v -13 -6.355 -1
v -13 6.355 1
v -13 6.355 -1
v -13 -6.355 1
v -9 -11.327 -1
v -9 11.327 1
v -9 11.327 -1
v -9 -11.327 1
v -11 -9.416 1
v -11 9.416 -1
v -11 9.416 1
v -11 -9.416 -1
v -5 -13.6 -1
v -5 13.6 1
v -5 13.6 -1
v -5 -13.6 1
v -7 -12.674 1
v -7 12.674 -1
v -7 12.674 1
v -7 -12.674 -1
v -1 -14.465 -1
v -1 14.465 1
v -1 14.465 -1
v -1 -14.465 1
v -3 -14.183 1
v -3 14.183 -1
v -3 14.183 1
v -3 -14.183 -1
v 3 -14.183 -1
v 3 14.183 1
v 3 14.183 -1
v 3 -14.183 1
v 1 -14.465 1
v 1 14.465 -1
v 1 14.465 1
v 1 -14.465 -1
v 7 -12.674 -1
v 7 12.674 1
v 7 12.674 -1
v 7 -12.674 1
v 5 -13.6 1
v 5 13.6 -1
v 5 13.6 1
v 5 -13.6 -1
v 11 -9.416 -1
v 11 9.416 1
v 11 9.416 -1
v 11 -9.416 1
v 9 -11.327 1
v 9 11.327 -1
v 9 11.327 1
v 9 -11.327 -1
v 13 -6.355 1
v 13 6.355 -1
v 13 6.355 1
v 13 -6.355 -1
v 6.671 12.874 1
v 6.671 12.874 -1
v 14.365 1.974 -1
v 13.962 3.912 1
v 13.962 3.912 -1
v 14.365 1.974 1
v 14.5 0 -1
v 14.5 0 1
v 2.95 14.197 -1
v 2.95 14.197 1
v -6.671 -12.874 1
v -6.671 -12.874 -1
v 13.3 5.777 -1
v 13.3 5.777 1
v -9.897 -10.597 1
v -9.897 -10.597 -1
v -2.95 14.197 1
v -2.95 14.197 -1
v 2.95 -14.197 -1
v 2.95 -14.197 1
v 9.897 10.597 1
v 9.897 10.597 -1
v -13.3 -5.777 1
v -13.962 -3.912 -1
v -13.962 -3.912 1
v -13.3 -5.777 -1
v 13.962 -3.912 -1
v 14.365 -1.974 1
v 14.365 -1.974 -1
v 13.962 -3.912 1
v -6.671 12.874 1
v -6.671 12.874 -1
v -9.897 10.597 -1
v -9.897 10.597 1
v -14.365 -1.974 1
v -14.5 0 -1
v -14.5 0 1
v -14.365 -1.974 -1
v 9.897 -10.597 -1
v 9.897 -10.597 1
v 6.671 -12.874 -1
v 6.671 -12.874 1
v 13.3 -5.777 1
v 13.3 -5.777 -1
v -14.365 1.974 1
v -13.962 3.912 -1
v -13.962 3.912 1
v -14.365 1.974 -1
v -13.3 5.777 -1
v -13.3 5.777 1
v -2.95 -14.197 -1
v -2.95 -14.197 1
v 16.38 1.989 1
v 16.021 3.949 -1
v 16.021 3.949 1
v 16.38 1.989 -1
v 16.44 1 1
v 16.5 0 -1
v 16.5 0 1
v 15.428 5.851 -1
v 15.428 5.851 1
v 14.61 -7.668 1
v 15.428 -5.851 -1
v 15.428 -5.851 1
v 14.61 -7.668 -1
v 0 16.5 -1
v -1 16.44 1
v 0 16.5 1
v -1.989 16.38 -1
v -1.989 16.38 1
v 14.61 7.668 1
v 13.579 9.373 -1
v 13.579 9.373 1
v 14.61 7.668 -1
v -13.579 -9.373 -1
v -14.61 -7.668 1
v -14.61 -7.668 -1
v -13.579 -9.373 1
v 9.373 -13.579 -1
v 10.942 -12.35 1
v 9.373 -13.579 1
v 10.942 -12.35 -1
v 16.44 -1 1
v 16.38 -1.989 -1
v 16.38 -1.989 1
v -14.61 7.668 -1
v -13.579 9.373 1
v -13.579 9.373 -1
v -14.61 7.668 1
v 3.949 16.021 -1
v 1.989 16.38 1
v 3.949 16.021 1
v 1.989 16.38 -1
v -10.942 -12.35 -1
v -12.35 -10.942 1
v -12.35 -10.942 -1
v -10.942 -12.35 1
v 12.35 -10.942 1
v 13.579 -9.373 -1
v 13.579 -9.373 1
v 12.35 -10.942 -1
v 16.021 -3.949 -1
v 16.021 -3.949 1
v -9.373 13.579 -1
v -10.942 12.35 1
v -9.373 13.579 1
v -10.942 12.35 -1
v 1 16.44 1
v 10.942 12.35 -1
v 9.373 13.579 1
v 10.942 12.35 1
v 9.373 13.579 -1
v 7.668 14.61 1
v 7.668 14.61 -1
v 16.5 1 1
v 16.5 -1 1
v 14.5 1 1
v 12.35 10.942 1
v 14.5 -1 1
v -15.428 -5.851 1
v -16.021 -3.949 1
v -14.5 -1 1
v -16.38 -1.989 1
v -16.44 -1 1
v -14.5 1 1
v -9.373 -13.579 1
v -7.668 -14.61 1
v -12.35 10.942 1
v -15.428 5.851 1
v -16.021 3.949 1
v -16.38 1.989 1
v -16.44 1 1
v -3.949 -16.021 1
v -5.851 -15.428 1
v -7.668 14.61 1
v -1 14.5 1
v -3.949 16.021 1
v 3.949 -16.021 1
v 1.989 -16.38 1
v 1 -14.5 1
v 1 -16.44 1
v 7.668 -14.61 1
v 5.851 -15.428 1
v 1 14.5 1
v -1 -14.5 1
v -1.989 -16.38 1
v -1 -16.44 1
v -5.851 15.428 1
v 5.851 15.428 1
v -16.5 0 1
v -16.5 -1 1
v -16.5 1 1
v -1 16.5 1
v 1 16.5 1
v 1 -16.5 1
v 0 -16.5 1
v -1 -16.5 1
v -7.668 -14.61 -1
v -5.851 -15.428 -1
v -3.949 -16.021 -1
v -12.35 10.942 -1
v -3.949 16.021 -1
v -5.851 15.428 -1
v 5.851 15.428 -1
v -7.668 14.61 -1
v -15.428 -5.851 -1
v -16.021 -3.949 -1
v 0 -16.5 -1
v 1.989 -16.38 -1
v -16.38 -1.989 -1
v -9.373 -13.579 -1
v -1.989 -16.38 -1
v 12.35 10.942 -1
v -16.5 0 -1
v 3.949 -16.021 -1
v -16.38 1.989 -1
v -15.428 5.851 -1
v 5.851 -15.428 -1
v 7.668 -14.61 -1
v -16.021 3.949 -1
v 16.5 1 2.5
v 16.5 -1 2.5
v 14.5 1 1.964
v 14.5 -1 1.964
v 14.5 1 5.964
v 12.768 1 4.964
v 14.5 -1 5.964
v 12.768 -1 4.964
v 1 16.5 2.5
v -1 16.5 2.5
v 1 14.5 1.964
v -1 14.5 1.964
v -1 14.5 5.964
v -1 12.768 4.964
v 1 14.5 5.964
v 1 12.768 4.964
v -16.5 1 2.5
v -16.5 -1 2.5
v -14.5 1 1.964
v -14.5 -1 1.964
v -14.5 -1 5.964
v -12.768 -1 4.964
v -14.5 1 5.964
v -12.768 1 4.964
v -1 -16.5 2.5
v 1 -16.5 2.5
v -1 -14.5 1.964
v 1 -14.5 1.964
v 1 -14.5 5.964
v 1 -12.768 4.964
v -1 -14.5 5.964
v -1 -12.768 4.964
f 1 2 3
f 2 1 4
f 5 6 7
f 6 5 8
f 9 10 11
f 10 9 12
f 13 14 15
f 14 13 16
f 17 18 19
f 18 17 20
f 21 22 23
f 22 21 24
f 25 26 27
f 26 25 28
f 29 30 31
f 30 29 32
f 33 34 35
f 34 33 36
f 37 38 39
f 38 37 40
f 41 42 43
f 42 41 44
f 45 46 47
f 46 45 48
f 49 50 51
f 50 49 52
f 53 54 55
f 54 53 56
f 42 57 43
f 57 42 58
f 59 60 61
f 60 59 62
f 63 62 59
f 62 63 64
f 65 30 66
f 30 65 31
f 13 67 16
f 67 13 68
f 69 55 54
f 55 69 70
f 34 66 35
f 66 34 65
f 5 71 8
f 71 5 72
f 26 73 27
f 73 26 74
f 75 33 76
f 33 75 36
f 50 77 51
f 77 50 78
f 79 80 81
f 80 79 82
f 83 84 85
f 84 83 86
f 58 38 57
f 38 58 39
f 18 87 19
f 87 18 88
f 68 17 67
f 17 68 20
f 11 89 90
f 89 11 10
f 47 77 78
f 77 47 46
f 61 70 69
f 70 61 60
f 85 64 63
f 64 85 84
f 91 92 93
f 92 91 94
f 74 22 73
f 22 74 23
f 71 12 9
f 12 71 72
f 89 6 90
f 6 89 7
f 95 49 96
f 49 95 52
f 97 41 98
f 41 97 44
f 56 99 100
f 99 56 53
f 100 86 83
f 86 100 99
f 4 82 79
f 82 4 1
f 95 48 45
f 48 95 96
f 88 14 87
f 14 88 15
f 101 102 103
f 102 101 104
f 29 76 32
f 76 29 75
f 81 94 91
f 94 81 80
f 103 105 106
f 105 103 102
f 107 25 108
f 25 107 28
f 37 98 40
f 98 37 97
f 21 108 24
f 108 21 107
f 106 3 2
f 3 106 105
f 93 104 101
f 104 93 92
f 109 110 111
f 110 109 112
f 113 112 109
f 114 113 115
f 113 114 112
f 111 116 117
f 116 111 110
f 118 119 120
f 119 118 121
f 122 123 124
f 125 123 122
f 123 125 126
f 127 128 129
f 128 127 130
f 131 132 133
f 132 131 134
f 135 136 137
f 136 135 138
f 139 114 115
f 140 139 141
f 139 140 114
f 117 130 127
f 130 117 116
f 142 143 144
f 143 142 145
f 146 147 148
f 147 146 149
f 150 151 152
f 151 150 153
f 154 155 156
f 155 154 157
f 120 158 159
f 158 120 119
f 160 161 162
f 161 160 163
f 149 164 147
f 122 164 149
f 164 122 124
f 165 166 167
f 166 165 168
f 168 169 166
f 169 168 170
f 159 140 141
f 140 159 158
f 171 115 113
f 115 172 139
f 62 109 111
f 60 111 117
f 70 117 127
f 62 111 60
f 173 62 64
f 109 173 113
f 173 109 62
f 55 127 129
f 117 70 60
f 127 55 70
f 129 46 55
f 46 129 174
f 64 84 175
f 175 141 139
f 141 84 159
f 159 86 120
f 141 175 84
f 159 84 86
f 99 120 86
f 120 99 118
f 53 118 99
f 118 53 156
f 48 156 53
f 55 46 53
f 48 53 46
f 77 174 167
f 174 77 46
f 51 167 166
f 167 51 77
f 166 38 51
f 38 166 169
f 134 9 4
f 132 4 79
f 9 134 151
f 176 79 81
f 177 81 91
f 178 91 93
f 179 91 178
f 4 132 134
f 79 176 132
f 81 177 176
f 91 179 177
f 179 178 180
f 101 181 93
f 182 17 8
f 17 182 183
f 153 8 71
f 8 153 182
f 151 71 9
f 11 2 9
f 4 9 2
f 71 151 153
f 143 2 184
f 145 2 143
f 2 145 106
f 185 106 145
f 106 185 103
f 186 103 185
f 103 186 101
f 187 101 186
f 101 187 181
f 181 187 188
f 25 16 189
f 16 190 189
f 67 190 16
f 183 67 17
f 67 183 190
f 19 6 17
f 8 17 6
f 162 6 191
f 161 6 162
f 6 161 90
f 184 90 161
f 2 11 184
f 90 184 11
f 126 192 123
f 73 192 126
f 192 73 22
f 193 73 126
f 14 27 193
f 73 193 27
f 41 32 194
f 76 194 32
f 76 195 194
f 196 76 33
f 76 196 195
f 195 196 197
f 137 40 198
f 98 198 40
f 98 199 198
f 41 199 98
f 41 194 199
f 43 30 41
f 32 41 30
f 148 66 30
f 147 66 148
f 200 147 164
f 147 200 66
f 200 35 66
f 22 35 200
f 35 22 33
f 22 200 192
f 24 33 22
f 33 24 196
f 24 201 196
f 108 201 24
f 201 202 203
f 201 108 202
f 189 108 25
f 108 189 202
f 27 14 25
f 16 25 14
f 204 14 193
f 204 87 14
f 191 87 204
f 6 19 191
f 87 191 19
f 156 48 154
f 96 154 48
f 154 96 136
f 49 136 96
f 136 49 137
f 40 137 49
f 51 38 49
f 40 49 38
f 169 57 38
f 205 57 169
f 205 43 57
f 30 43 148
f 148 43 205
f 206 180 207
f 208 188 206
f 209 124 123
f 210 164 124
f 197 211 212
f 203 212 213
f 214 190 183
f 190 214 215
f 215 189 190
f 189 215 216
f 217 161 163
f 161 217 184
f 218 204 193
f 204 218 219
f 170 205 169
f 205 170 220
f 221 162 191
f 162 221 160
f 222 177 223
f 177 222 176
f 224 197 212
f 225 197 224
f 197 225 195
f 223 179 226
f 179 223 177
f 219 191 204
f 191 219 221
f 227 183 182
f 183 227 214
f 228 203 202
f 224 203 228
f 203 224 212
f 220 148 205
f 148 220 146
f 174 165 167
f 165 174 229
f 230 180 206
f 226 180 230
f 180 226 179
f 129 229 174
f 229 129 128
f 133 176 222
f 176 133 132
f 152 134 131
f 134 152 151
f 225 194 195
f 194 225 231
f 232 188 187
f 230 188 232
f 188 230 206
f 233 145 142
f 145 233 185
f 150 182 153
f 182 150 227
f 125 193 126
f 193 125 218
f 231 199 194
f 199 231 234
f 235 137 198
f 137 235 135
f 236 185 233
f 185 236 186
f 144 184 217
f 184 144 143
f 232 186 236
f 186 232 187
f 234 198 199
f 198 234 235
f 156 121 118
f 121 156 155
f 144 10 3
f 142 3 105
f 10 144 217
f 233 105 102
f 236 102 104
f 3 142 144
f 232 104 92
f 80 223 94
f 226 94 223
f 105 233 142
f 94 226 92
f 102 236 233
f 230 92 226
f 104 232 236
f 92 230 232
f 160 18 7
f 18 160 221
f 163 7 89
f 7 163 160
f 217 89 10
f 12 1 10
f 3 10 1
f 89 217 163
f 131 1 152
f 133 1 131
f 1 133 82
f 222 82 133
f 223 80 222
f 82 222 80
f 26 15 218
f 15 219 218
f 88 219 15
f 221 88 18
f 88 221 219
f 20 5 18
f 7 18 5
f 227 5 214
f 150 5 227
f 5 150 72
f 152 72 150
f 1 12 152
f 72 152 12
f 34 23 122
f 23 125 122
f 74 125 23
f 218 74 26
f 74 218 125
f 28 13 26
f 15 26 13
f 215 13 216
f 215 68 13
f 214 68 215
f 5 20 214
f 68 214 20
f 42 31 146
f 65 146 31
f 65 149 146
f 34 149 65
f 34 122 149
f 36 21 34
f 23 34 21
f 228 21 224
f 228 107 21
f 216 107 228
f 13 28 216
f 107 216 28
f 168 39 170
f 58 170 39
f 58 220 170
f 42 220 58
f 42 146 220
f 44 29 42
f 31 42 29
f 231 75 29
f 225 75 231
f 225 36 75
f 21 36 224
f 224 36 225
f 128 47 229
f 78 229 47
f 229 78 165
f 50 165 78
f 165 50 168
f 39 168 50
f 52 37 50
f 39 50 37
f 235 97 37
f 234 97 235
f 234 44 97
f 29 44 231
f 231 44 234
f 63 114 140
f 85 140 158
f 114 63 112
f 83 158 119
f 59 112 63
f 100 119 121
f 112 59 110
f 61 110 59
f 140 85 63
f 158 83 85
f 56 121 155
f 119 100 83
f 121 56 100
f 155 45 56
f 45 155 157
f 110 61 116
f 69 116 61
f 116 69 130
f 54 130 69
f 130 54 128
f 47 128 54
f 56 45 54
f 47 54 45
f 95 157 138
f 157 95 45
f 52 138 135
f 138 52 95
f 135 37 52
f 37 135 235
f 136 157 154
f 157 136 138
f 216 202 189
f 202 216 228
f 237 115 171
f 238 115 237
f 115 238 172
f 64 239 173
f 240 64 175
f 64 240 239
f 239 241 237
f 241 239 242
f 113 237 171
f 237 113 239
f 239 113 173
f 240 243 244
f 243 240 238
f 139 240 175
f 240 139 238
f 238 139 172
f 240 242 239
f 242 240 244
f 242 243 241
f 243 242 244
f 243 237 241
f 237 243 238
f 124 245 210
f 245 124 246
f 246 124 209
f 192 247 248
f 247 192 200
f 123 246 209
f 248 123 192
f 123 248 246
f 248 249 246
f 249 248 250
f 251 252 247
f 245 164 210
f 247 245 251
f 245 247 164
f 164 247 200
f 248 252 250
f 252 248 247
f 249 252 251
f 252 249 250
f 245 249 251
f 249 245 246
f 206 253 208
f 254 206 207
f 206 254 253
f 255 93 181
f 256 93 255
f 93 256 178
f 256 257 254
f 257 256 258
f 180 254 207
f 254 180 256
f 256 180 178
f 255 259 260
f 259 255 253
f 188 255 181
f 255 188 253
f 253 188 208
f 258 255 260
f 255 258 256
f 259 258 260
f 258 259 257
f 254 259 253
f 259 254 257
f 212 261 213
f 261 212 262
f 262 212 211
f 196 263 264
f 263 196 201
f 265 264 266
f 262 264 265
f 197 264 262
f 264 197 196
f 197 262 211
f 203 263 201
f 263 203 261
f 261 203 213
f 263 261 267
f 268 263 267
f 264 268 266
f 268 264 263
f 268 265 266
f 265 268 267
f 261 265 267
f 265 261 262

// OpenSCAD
// Convenience modules.


function segs(r) = $fn>0?($fn>3?$fn:3):(ceil(max(min(360.0/$fa,abs(r)*2*3.14159/$fs),5)));

function hypot(x,y) = sqrt(x*x+y*y);

function distance(point1, point2) =
	sqrt(
		pow(point2[0]-point1[0], 2.0) +
		pow(point2[1]-point1[1], 2.0) +
		((len(point1)<3)? 0.0 : pow(point2[2]-point1[2], 2.0))
	);

function cdr(list) = len(list)>1?[for (i=[1:len(list)-1]) list[i]]:[];
function reverse(list) = [ for (i = [len(list)-1 : -1 : 0]) list[i] ];


// Optionally pre-render if someone sets $do_prerender=true
//$do_prerender = true;
module prerender(convexity=10) {
	if ($do_prerender == true) {
		render(convexity=convexity) {
			children();
		}
	} else {
		children();
	}
}


// Rotates children around the Z axis by the given number of degrees.
// Example:
//   xrot(90) cylinder(h=10, r=2, center=true);
module xrot(a=0)
{
	rotate([a, 0, 0])
		children();
}


// Rotates children around the Y axis by the given number of degrees.
// Example:
//   yrot(90) cylinder(h=10, r=2, center=true);
module yrot(a=0)
{
	rotate([0, a, 0])
		children();
}


// Rotates children around the Z axis by the given number of degrees.
// Example:
//   zrot(90) cube(size=[9,1,4], center=true);
module zrot(a=0)
{
	rotate([0, 0, a])
		children();
}



module skew_along_x(yang=0, zang=0)
{
	multmatrix(m = [
		[1,         0,          0,        0],
		[sin(yang), 1,          0,        0],
		[sin(zang), 0,          1,        0],
		[0,         0,          0,        1]
	]) {
		children();
	}
}



module skew_along_y(xang=0, zang=0)
{
	multmatrix(m = [
		[1, sin(xang),          0,        0],
		[0,         1,          0,        0],
		[0, sin(zang),          1,        0],
		[0,         0,          0,        1]
	]) {
		children();
	}
}



module skew_along_z(xang=0, yang=0)
{
	multmatrix(m = [
		[1,         0,  sin(xang),        0],
		[0,         1,  sin(yang),        0],
		[0,         0,          1,        0],
		[0,         0,          0,        1]
	]) {
		children();
	}
}



module mirror_copy(v=[0,0,1])
{
	union() {
		children();
		mirror(v) children();
	}
}


// Given a number of euller angles, rotates copies of the given children to each of those angles.
// Example:
//   rot_copies(rots=[[0,0,0],[45,0,0],[0,45,120],[90,-45,270]])
//     translate([6,0,0]) cube(size=[9,1,4], center=true);
module rot_copies(rots=[[0,0,0]])
{
	for (rot = rots)
		rotate(rot)
			children();
}



// Given an array of angles, rotates copies of the children to each of those angles around the X axis.
// Example:
//   xrot_copies(rots=[0,15,30,60,120,240]) translate([0,6,0]) cube(size=[4,9,1], center=true);
//   xrot_copies(count=6, offset=15) translate([0,6,0]) cube(size=[4,9,1], center=true);
module xrot_copies(rots=[0], offset=0, count=undef)
{
	if (count != undef) {
		for (i = [0 : count-1]) {
			a = (i / count) * 360.0;
			rotate([a+offset, 0, 0]) {
				children();
			}
		}
	} else {
		for (a = rots) {
			rotate([a+offset, 0, 0]) {
				children();
			}
		}
	}
}


// Given an array of angles, rotates copies of the children to each of those angles around the Y axis.
// Example:
//   yrot_copies(rots=[0,15,30,60,120,240]) translate([6,0,0]) cube(size=[9,4,1], center=true);
//   yrot_copies(count=6, offset=15) translate([6,0,0]) cube(size=[9,4,1], center=true);
module yrot_copies(rots=[0], offset=0, count=undef)
{
	if (count != undef) {
		for (i = [0 : count-1]) {
			a = (i / count) * 360.0;
			rotate([0, a+offset, 0]) {
				children();
			}
		}
	} else {
		for (a = rots) {
			rotate([0, a+offset, 0]) {
				children();
			}
		}
	}
}


// Given an array of angles, rotates copies of the children to each of those angles around the Z axis.
// Example:
//   zrot_copies(rots=[0,15,30,60,120,240]) translate([6,0,0]) cube(size=[9,1,4], center=true);
//   zrot_copies(count=6, offset=15) translate([6,0,0]) cube(size=[9,1,4], center=true);
module zrot_copies(rots=[0], offset=0, count=undef)
{
	if (count != undef) {
		for (i = [0 : count-1]) {
			a = (i / count) * 360.0;
			rotate([0, 0, a+offset]) {
				children();
			}
		}
	} else {
		for (a = rots) {
			rotate([0, 0, a+offset]) {
				children();
			}
		}
	}
}


// Makes copies of the given children at each of the given offsets.
//   offsets = array of XYZ offset vectors. Default [[0,0,0]]
// Example:
//   translate_copies([[-5,-5,0], [5,-5,0], [0,-5,7], [0,5,0]])
//     sphere(r=3,center=true);
module translate_copies(offsets=[[0,0,0]])
{
	for (off = offsets)
		translate(off)
			children();
}


// Makes a 3D XYZ grid of duplicate children.
//   xa = array or range of X-axis values to offset by. (Default: [0])
//   ya = array or range of Y-axis values to offset by. (Default: [0])
//   za = array or range of Z-axis values to offset by. (Default: [0])
//   count = number of copies to have per axis. (Default: none)
//   spacing = spacing of copies per axis. Use with count. (Default: 0)
// Examples:
//   grid_of(xa=[0,2,3,5],ya=[3:5],za=[-4:2:6]) sphere(r=0.5,center=true);
//   grid_of(ya=[-6:3:6],za=[4,7]) sphere(r=1,center=true);
//   grid_of(count=3, spacing=10) sphere(r=1,center=true);
//   grid_of(count=[3, 1, 2], spacing=10) sphere(r=1,center=true);
//   grid_of(count=[3, 4], spacing=[10, 8]) sphere(r=1,center=true);
//   grid_of(count=[3, 4, 2], spacing=[10, 8, 5]) sphere(r=1,center=true, $fn=24);
module grid_of(xa=[0], ya=[0], za=[0], count=[], spacing=[])
{
	count = (len(count) == undef)? [count,1,1] :
			((len(count) == 1)? [count[0], 1, 1] :
			((len(count) == 2)? [count[0], count[1], 1] :
			((len(count) == 3)? count : undef)));

	spacing = (len(spacing) == undef)? [spacing,spacing,spacing] :
			((len(spacing) == 1)? [spacing[0], 0, 0] :
			((len(spacing) == 2)? [spacing[0], spacing[1], 0] :
			((len(spacing) == 3)? spacing : undef)));

	if (count != undef && spacing != undef) {
		for (x = [-(count[0]-1)/2 : (count[0]-1)/2 + 0.1]) {
			for (y = [-(count[1]-1)/2 : (count[1]-1)/2 + 0.1]) {
				for (z = [-(count[2]-1)/2 : (count[2]-1)/2 + 0.1]) {
					translate([x*spacing[0], y*spacing[1], z*spacing[2]]) {
						children();
					}
				}
			}
		}
	} else {
		for (xoff = xa) {
			for (yoff = ya) {
				for (zoff = za) {
					translate([xoff,yoff,zoff]) {
						children();
					}
				}
			}
		}
	}
}


// Evenly distributes n duplicate children around a circle on the XY plane.
//   n = number of copies to distribute around the circle. (Default: 6)
//   r = radius of circle (Default: 1)
//   rx = radius of ellipse on X axis. Used instead of r.
//   ry = radius of ellipse on Y axis. Used instead of r.
//   d = diameter of circle. (Default: 2)
//   dx = diameter of ellipse on X axis. Used instead of d.
//   dy = diameter of ellipse on Y axis. Used instead of d.
//   rot = whether to rotate the copied children.  (Default: false)
//   sa = starting angle. (Default: 0.0)
//   ea = ending angle. Will distribute copies CCW from sa to ea. (Default: 360.0)
// Examples:
//   circle_of(d=8,n=5)
//     cube(size=[3,1,1],center=true);
//   circle_of(r=10,n=12,rot=true)
//     cube(size=[3,1,1],center=true);
//   circle_of(rx=15,ry=10,n=12,rot=true)
//     cube(size=[3,1,1],center=true);
//   circle_of(r=10,n=5,rot=true,sa=30.0,ea=150.0)
//     cube(size=[3,1,1],center=true);
//
module circle_of(
		n=6,
		r=1, rx=undef, ry=undef,
		d=undef, dx=undef, dy=undef,
		sa=0.0, ea=360.0,
		rot=false
) {
	r = (d == undef)?r:(d/2.0);
	rx = (dx == undef)?rx:(dx/2.0);
	ry = (dy == undef)?rx:(dy/2.0);
	rx = (rx == undef)?r:rx;
	ry = (ry == undef)?r:ry;
	sa = ((sa % 360.0) + 360.0) % 360.0; // make 0 < ang < 360 
	ea = ((ea % 360.0) + 360.0) % 360.0; // make 0 < ang < 360
	n = (abs(ea-sa)<0.01)?(n+1):n;
	delt = (((ea<=sa)?360.0:0)+ea-sa)/(n-1);
	for (ang = [sa:delt:(sa+delt*(n-1))])
		if (abs(abs(ang-sa)-360.0) > 0.01)
			translate([cos(ang)*rx,sin(ang)*ry,0])
				rotate([0,0,rot?atan2(sin(ang)*ry,cos(ang)*rx):0])
					children();
}



// Evenly distributes n duplicate children along an XYZ line.
//   p1 = starting point of line.  (Default: [0,0,0])
//   p2 = ending point of line.  (Default: [10,0,0])
//   n = number of copies to distribute along the line. (Default: 6)
// Examples:
//   line_of(p1=[0,0,0], p2=[-10,15,20], n=5)
//     cube(size=[3,1,1],center=true);
//
module line_of(p1=[0,0,0], p2=[10,0,0], n=6)
{
	delta = (p2 - p1) / (n-1);
	for (i = [0:n-1])
		translate([p1[0]+delta[0]*i, p1[1]+delta[1]*i, p1[2]+delta[2]*i])
			children();
}


// Makes a cube with rounded edges and corners.
//   size = size of cube [X,Y,Z].  (Default: [1,1,1])
//   r = radius of edge/corner rounding.  (Default: 0.25)
// Examples:
//   rcube(size=[9,4,1], r=0.333, center=true, $fn=24);
//   rcube(size=[5,7,3], r=1);
module rcube(size=[1,1,1], r=0.25, center=false, $fn=undef)
{
	$fn = ($fn==undef)?max(18,floor(180/asin(1/r)/2)*2):$fn;
	xoff=abs(size[0])/2-r;
	yoff=abs(size[1])/2-r;
	zoff=abs(size[2])/2-r;
	offset = center?[0,0,0]:size/2;
	translate(offset) {
		union() {
			grid_of([-xoff,xoff],[-yoff,yoff],[-zoff,zoff])
				sphere(r=r,center=true,$fn=$fn);
			grid_of(xa=[-xoff,xoff],ya=[-yoff,yoff])
				cylinder(r=r,h=zoff*2,center=true,$fn=$fn);
			grid_of(xa=[-xoff,xoff],za=[-zoff,zoff])
				rotate([90,0,0])
					cylinder(r=r,h=yoff*2,center=true,$fn=$fn);
			grid_of(ya=[-yoff,yoff],za=[-zoff,zoff])
				rotate([90,0,0])
				rotate([0,90,0])
					cylinder(r=r,h=xoff*2,center=true,$fn=$fn);
			cube(size=[xoff*2,yoff*2,size[2]], center=true);
			cube(size=[xoff*2,size[1],zoff*2], center=true);
			cube(size=[size[0],yoff*2,zoff*2], center=true);
		}
	}
}



// Makes a cube with rounded vertical edges.
//   size = size of cube [X,Y,Z].  (Default: [1,1,1])
//   r = radius of edge/corner rounding.  (Default: 0.25)
// Examples:
//   rrect(size=[9,4,1], r=1, center=true);
//   rrect(size=[5,7,3], r=1, $fn=24);
module rrect(size=[1,1,1], r=0.25, center=false, $fn=undef)
{
	$fn = ($fn==undef)?max(18,floor(180/asin(1/r)/2)*2):$fn;
	xoff=abs(size[0])/2-r;
	yoff=abs(size[1])/2-r;
	offset = center?[0,0,0]:size/2;
	translate(offset) {
		union(){
			grid_of([-xoff,xoff],[-yoff,yoff])
				cylinder(r=r,h=size[2],center=true,$fn=$fn);
			cube(size=[xoff*2,size[1],size[2]], center=true);
			cube(size=[size[0],yoff*2,size[2]], center=true);
		}
	}
}



// Makes a cube with chamfered edges.
//   size = size of cube [X,Y,Z].  (Default: [1,1,1])
//   chamfer = chamfer inset along axis.  (Default: 0.25)
module chamfcube(
		size=[1,1,1],
		chamfer=0.25,
		chamfaxes=[1,1,1],
		chamfcorners=false
) {
	ch_width = sqrt(2)*chamfer;
	ch_offset = 1;
	difference() {
		cube(size=size, center=true);
		for (xs = [-1,1]) {
			for (ys = [-1,1]) {
				if (chamfaxes[0] == 1) {
					translate([0,xs*size[1]/2,ys*size[2]/2]) {
						rotate(a=[45,0,0])
						 cube(size=[size[0]+0.1,ch_width,ch_width], center=true);
					}
				}
				if (chamfaxes[1] == 1) {
					translate([xs*size[0]/2,0,ys*size[2]/2]) {
						rotate(a=[0,45,0])
						 cube(size=[ch_width,size[1]+0.1,ch_width], center=true);
					}
				}
				if (chamfaxes[2] == 1) {
					translate([xs*size[0]/2,ys*size[1]/2],0) {
						rotate(a=[0,0,45])
						 cube(size=[ch_width,ch_width,size[2]+0.1], center=true);
					}
				}
				if (chamfcorners) {
					for (zs = [-1,1]) {
						translate([xs*size[0]/2,ys*size[1]/2,zs*size[2]/2]) {
							scale([chamfer,chamfer,chamfer]) {
								polyhedron(
									points=[
										[0,-1,-1], [0,-1,1], [0,1,1], [0,1,-1],
										[-1,0,-1], [-1,0,1], [1,0,1], [1,0,-1],
										[-1,-1,0], [-1,1,0], [1,1,0], [1,-1,0]
									],
									faces=[
										[ 8,  4,  9,  5],
										[ 9,  3, 10,  2],
										[10,  7, 11,  6],
										[11,  0,  8,  1],
										[ 0,  7,  3,  4],
										[ 1,  5,  2,  6],

										[ 1,  8,  5],
										[ 5,  9,  2],
										[ 2, 10,  6],
										[ 6, 11,  1],

										[ 0,  4,  8],
										[ 4,  3,  9],
										[ 3,  7, 10],
										[ 7,  0, 11],
									]
								);
							}
						}
					}
				}
			}
		}
	}
}



// Makes a teardrop shape in the XZ plane. Useful for 3D printable holes.
//   r = radius of circular part of teardrop.  (Default: 1)
//   h = thickness of teardrop. (Default: 1)
// Example:
//   teardrop(r=3, h=2, ang=30);
module teardrop(r=1, h=1, ang=45, $fn=undef)
{
	$fn = ($fn==undef)?max(12,floor(180/asin(1/r)/2)*2):$fn;
	xrot(90) union() {
		translate([0, r*sin(ang), 0]) {
			scale([1, 1/tan(ang), 1]) {
				difference() {
					zrot(45) {
						cube(size=[2*r*cos(ang)/sqrt(2), 2*r*cos(ang)/sqrt(2), h], center=true);
					}
					translate([0, -r/2, 0]) {
						cube(size=[2*r, r, h+1], center=true);
					}
				}
			}
		}
		cylinder(h=h, r=r, center=true);
	}
}



// Makes a simple threadless screw, useful for making screwholes.
//   screwsize = diameter of threaded part of screw.
//   screwlen = length of threaded part of screw.
//   headsize = diameter of the screw head.
//   headlen = length of the screw head.
// Example:
//   screw(screwsize=3,screwlen=10,headsize=6,headlen=3);
module screw(screwsize=3,screwlen=10,headsize=6,headlen=3,$fn=undef)
{
	$fn = ($fn==undef)?max(8,floor(180/asin(2/screwsize)/2)*2):$fn;
	translate([0,0,-(screwlen)/2])
		cylinder(r=screwsize/2, h=screwlen+0.05, center=true, $fn=$fn);
	translate([0,0,(headlen)/2])
		cylinder(r=headsize/2, h=headlen, center=true, $fn=$fn*2);
}


function get_metric_bolt_head_size(size) = lookup(size, [
		[ 4.0,  7.0],
		[ 5.0,  8.0],
		[ 6.0, 10.0],
		[ 7.0, 11.0],
		[ 8.0, 13.0],
		[10.0, 16.0],
		[12.0, 18.0],
		[14.0, 21.0],
		[16.0, 24.0],
		[18.0, 27.0],
		[20.0, 30.0]
	]);


function get_metric_nut_size(size) = lookup(size, [
		[ 2.0,  4.0],
		[ 2.5,  5.0],
		[ 3.0,  5.5],
		[ 4.0,  7.0],
		[ 5.0,  8.0],
		[ 6.0, 10.0],
		[ 7.0, 11.0],
		[ 8.0, 13.0],
		[10.0, 17.0],
		[12.0, 19.0],
		[14.0, 22.0],
		[16.0, 24.0],
		[18.0, 27.0],
		[20.0, 30.0],
	]);


function get_metric_nut_thickness(size) = lookup(size, [
		[ 2.0,  1.6],
		[ 2.5,  2.0],
		[ 3.0,  2.4],
		[ 4.0,  3.2],
		[ 5.0,  4.0],
		[ 6.0,  5.0],
		[ 7.0,  5.5],
		[ 8.0,  6.5],
		[10.0,  8.0],
		[12.0, 10.0],
		[14.0, 11.0],
		[16.0, 13.0],
		[18.0, 15.0],
		[20.0, 16.0]
	]);



// Makes an unthreaded model of a standard nut for a standard metric screw.
//   size = standard metric screw size in mm. (Default: 3)
//   hole = include an unthreaded hole in the nut.  (Default: true)
// Example:
//   metric_nut(size=8, hole=true);
//   metric_nut(size=3, hole=false);
module metric_nut(size=3, hole=true, $fn=undef, center=false)
{
	$fn = ($fn==undef)?max(8,floor(180/asin(2/size)/2)*2):$fn;
	radius = get_metric_nut_size(size)/2/cos(30);
	thick = get_metric_nut_thickness(size);
	offset = (center == true)? 0 : thick/2;
	translate([0,0,offset]) difference() {
		cylinder(r=radius, h=thick, center=true, $fn=6);
		if (hole == true)
			cylinder(r=size/2, h=thick+0.5, center=true, $fn=$fn);
	}
}



function get_lmXuu_bearing_diam(size) = lookup(size, [
		[  4.0,   8.0],
		[  5.0,  10.0],
		[  6.0,  12.0],
		[  8.0,  15.0],
		[ 10.0,  19.0],
		[ 12.0,  21.0],
		[ 13.0,  23.0],
		[ 16.0,  28.0],
		[ 20.0,  32.0],
		[ 25.0,  40.0],
		[ 30.0,  45.0],
		[ 35.0,  52.0],
		[ 40.0,  60.0],
		[ 50.0,  80.0],
		[ 60.0,  90.0],
		[ 80.0, 120.0],
		[100.0, 150.0]
	]);


function get_lmXuu_bearing_length(size) = lookup(size, [
		[  4.0,  12.0],
		[  5.0,  15.0],
		[  6.0,  19.0],
		[  8.0,  24.0],
		[ 10.0,  29.0],
		[ 12.0,  30.0],
		[ 13.0,  32.0],
		[ 16.0,  37.0],
		[ 20.0,  42.0],
		[ 25.0,  59.0],
		[ 30.0,  64.0],
		[ 35.0,  70.0],
		[ 40.0,  80.0],
		[ 50.0, 100.0],
		[ 60.0, 110.0],
		[ 80.0, 140.0],
		[100.0, 175.0]
	]);


// Creates a model of a clamp to hold a given linear bearing cartridge.
//   d = Diameter of linear bearing. (Default: 15)
//   l = Length of linear bearing. (Default: 24)
//   tab = Clamp tab height. (Default: 7)
//   tabwall = Clamp Tab thickness. (Default: 5)
//   wall = Wall thickness of clamp housing. (Default: 3)
//   gap = Gap in clamp. (Default: 5)
//   screwsize = Size of screw to use to tighten clamp. (Default: 3)
module linear_bearing_housing(d=15,l=24,tab=7,gap=5,wall=3,tabwall=5,screwsize=3)
{
	od = d+2*wall;
	ogap = gap+2*tabwall;
	tabh = tab/2+od/2*sqrt(2)-ogap/2;
	translate([0,0,od/2]) difference() {
		union() {
			rotate([0,0,90])
				teardrop(r=od/2,h=l);
			translate([0,0,tabh])
				cube(size=[l,ogap,tab+0.05], center=true);
			translate([0,0,-od/4])
				cube(size=[l,od,od/2], center=true);
		}
		rotate([0,0,90])
			teardrop(r=d/2,h=l+0.05);
		translate([0,0,(d*sqrt(2)+tab)/2])
			cube(size=[l+0.05,gap,d+tab], center=true);
		translate([0,0,tabh]) {
			translate([0,-ogap/2+2-0.05,0])
				rotate([90,0,0])
					screw(screwsize=screwsize*1.06, screwlen=ogap, headsize=screwsize*2, headlen=10);
			translate([0,ogap/2+0.05,0])
				rotate([90,0,0])
					metric_nut(size=screwsize,hole=false);
		}
	}
}


module lmXuu_housing(size=8,tab=7,gap=5,wall=3,tabwall=5,screwsize=3)
{
	d = get_lmXuu_bearing_diam(size);
	l = get_lmXuu_bearing_length(size);
	linear_bearing_housing(d=d,l=l,tab=tab,gap=gap,wall=wall,tabwall=tabwall,screwsize=screwsize);
}
//lmXuu_housing(size=8);
//lmXuu_housing(size=10);


// Makes a hollow tube with the given size and wall thickness.
//   h = height of tube. (Default: 1)
//   r = Outer radius of tube.  (Default: 1)
//   r1 = Outer radius of bottom of tube.  (Default: value of r)
//   r2 = Outer radius of top of tube.  (Default: value of r)
//   wall = horizontal thickness of tube wall. (Default 0.5)
// Example:
//   tube(h=3, r=4, wall=1, center=true);
//   tube(h=6, r=4, wall=2, $fn=6);
//   tube(h=3, r1=5, r2=7, wall=2, center=true);
module tube(h=1, r=1, r1=undef, r2=undef, wall=0.5, center=false, $fn=undef)
{
	r1 = (r1==undef)? r : r1;
	r2 = (r2==undef)? r : r2;
	$fn = ($fn==undef)?max(12,floor(180/asin(2/max(r1,r2))/2)*2):$fn;
	difference() {
		cylinder(h=h, r1=r1, r2=r2, center=center, $fn=$fn);
		cylinder(h=h+0.03, r1=r1-wall, r2=r2-wall, center=center, $fn=$fn);
	}
}



// Example:
//   narrowing_strut(w=10, l=100, wall=3, ang=30);
module narrowing_strut(w=10, l=100, wall=5, ang=30)
{
	union() {
		translate([0, 0, wall/2])
			cube(size=[w, l, wall], center=true);
		difference() {
			translate([0, 0, wall])
				scale([1, 1, 1/tan(ang)]) yrot(45)
					cube(size=[w/sqrt(2), l, w/sqrt(2)], center=true);
			translate([0, 0, -w+0.05])
				cube(size=[w+1, l+1, w*2], center=true);
		}
	}
}
//!narrowing_strut();



// Makes a wall which thins to a smaller width in the center,
// with angled supports to prevent critical overhangs.
// Example:
//   thinning_wall(h=50, l=100, thick=4, ang=30, strut=5, wall=2);
module thinning_wall(h=50, l=100, thick=5, ang=30, strut=5, wall=3, bracing=true)
{
	dang = atan((h-2*strut)/(l-2*strut));
	dlen = (h-2*strut)/sin(dang);
	union() {
		xrot_copies([0, 180]) {
			translate([0, 0, -h/2])
				narrowing_strut(w=thick, l=l, wall=strut, ang=ang);
			translate([0, -l/2, 0])
				xrot(-90) narrowing_strut(w=thick, l=h-0.1, wall=strut, ang=ang);
			if (bracing == true) {
				intersection() {
					cube(size=[thick, l, h], center=true);
					xrot_copies([-dang,dang]) {
						grid_of(za=[-strut/4, strut/4]) {
							scale([1,1,1.5]) yrot(45) {
								cube(size=[thick/sqrt(2), dlen, thick/sqrt(2)], center=true);
							}
						}
						cube(size=[thick, dlen, strut/2], center=true);
					}
				}
			}
		}
		cube(size=[wall, l-0.1, h-0.1], center=true);
	}
}
//!thinning_wall(bracing=false);



// Makes a triangular wall which thins to a smaller width in the center,
// with angled supports to prevent critical overhangs.
// Example:
//   thinning_triangle(h=50, l=100, thick=4, ang=30, strut=5, wall=2);
module thinning_triangle(h=50, l=100, thick=5, ang=30, strut=5, wall=3, diagonly=false)
{
	dang = atan((h-strut)/(l-strut));
	dlen = (h-strut)/sin(dang);
	difference() {
		union() {
			if (!diagonly) {
				translate([0, 0, -h/2])
					narrowing_strut(w=thick, l=l, wall=strut, ang=ang);
				translate([0, -l/2, 0])
					xrot(-90) narrowing_strut(w=thick, l=h-0.1, wall=strut, ang=ang);
			}
			intersection() {
				cube(size=[thick, l, h], center=true);
				xrot(-dang) yrot(180) {
					narrowing_strut(w=thick, l=dlen*1.2, wall=strut, ang=ang);
				}
			}
			cube(size=[wall, l-0.1, h-0.1], center=true);
		}
		xrot(-dang) {
			translate([0, 0, h/2]) {
				cube(size=[thick+0.1, l*2, h], center=true);
			}
		}
	}
}
//!thinning_triangle(bracing=false);



// Makes a triangular wall which thins to a smaller width in the center,
// with angled supports to prevent critical overhangs.
// Example:
//   thinning_brace(h=50, l=100, thick=4, ang=30, strut=5, wall=2);
module thinning_brace(h=50, l=100, thick=5, ang=30, strut=5, wall=3)
{
	dang = atan((h)/(l));
	dlen = (h)/sin(dang);
	difference() {
		union() {
			intersection() {
				cube(size=[thick, l, h], center=true);
				translate([0, 0, 0]) {
					xrot(-dang) yrot(180) {
						narrowing_strut(w=thick, l=dlen, wall=strut, ang=ang);
					}
				}
			}
			cube(size=[wall, l-0.1, h-0.1], center=true);
		}
		xrot(-dang) {
			translate([0, 0, h/2]) {
				cube(size=[thick+0.1, l*2, h], center=true);
			}
		}
	}
}
//!thinning_brace(bracing=false);



// Example:
//   sparse_strut(h=40, l=120, thick=4, maxang=30, strut=5, max_bridge=20);
module sparse_strut(h=50, l=100, thick=4, maxang=30, strut=5, max_bridge = 20)
{

	zoff = h/2 - strut/2;
	yoff = l/2 - strut/2;

	maxhyp = 1.5 * (max_bridge+strut)/2 / sin(maxang);
	maxz = 2 * maxhyp * cos(maxang);

	zreps = ceil(2*zoff/maxz);
	zstep = 2*zoff / zreps;

	hyp = zstep/2 / cos(maxang);
	maxy = min(2 * hyp * sin(maxang), max_bridge+strut);

	yreps = ceil(2*yoff/maxy);
	ystep = 2*yoff / yreps;

	ang = atan(ystep/zstep);
	len = zstep / cos(ang);

	union() {
		grid_of(za=[-zoff, zoff])
			cube(size=[thick, l, strut], center=true);
		grid_of(ya=[-yoff, yoff])
			cube(size=[thick, strut, h], center=true);
		grid_of(ya=[-yoff+ystep/2:ystep:yoff], za=[-zoff+zstep/2:zstep:zoff]) {
			xrot( ang) cube(size=[thick, strut, len], center=true);
			xrot(-ang) cube(size=[thick, strut, len], center=true);
		}
	}
}


// Makes a corrugated wall which relieved contraction stress while
// still providing support strength.
// Example:
//   corrugated_wall(h=50, l=100, thick=4, ang=30, strut=5, wall=2);
module corrugated_wall(h=50, l=100, thick=5, ang=30, strut=5, wall=2)
{
	innerlen = l - strut*2;
	inner_height = h - wall*2;
	spacing = thick*sqrt(3);
	corr_count = floor(innerlen/spacing/2)*2;

	grid_of(ya=[-(l-strut)/2, (l-strut)/2]) {
		cube(size=[thick, strut, h], center=true);
	}
	grid_of(za=[-(h-wall)/2, (h-wall)/2]) {
		cube(size=[thick, l, wall], center=true);
	}

	prerender(convexity=corr_count*4+4)
	difference() {
		for (ypos = [-innerlen/2:spacing:innerlen/2]) {
			translate([0, ypos, 0]) {
				translate([0, spacing/4, 0])
					zrot(-45) cube(size=[wall, thick*sqrt(2), inner_height], center=true);
				translate([0, spacing*3/4, 0])
					zrot(45) cube(size=[wall, thick*sqrt(2), inner_height], center=true);
			}
		}
		grid_of(xa=[-thick, thick]) {
			cube(size=[thick, l, h], center=true);
		}
		grid_of(ya=[-l, l]) {
			cube(size=[thick*2, l, h], center=true);
		}
	}
}
//!corrugated_wall(h=50, l=100, thick=5, ang=30, strut=5, wall=2);



module torus(or=1, ir=0.5)
{
	rotate_extrude(convexity = 10)
		translate([(or-ir)/2+ir, 0, 0])
			circle(r = (or-ir)/2, $fs=1);
}
//!torus(or=30, ir=10);



module chamfer(chamfer=1, size=[1,1,1], edges=[[0,0,0,0], [1,1,0,0], [0,0,0,0]])
{
	difference() {
		union() {
			children();
		}
		union() {
			if (edges[0][0] != 0)
				translate([0,  size[1]/2,  size[2]/2])
					xrot(45) cube(size=[size[0]+0.1, chamfer*sqrt(2), chamfer*sqrt(2)], center=true);
			if (edges[0][1] != 0)
				translate([0, -size[1]/2,  size[2]/2])
					xrot(45) cube(size=[size[0]+0.1, chamfer*sqrt(2), chamfer*sqrt(2)], center=true);
			if (edges[0][2] != 0)
				translate([0,  size[1]/2, -size[2]/2])
					xrot(45) cube(size=[size[0]+0.1, chamfer*sqrt(2), chamfer*sqrt(2)], center=true);
			if (edges[0][3] != 0)
				translate([0, -size[1]/2, -size[2]/2])
					xrot(45) cube(size=[size[0]+0.1, chamfer*sqrt(2), chamfer*sqrt(2)], center=true);

			if (edges[1][0] != 0)
				translate([ size[0]/2, 0,  size[2]/2])
					yrot(45) cube(size=[chamfer*sqrt(2), size[1]+0.1, chamfer*sqrt(2)], center=true);
			if (edges[1][1] != 0)
				translate([-size[0]/2, 0,  size[2]/2])
					yrot(45) cube(size=[chamfer*sqrt(2), size[1]+0.1, chamfer*sqrt(2)], center=true);
			if (edges[1][2] != 0)
				translate([ size[0]/2, 0, -size[2]/2])
					yrot(45) cube(size=[chamfer*sqrt(2), size[1]+0.1, chamfer*sqrt(2)], center=true);
			if (edges[1][3] != 0)
				translate([-size[0]/2, 0, -size[2]/2])
					yrot(45) cube(size=[chamfer*sqrt(2), size[1]+0.1, chamfer*sqrt(2)], center=true);

			if (edges[2][0] != 0)
				translate([ size[0]/2,  size[1]/2, 0])
					zrot(45) cube(size=[chamfer*sqrt(2), chamfer*sqrt(2), size[2]+0.1], center=true);
			if (edges[2][1] != 0)
				translate([-size[0]/2,  size[1]/2, 0])
					zrot(45) cube(size=[chamfer*sqrt(2), chamfer*sqrt(2), size[2]+0.1], center=true);
			if (edges[2][2] != 0)
				translate([ size[0]/2, -size[1]/2, 0])
					zrot(45) cube(size=[chamfer*sqrt(2), chamfer*sqrt(2), size[2]+0.1], center=true);
			if (edges[2][3] != 0)
				translate([-size[0]/2, -size[1]/2, 0])
					zrot(45) cube(size=[chamfer*sqrt(2), chamfer*sqrt(2), size[2]+0.1], center=true);
		}
	}
}
//!chamfer(chamfer=2, size=[10,40,90], edges=[[0,0,0,0], [1,1,0,0], [0,0,0,0]]) {
//	cube(size=[10,40,90], center=true);
//}


module extrude_2d_hollow(wall=2, height=50, twist=90, slices=60)
{
  linear_extrude(height=height, twist=twist, slices=slices) {
    difference() {
      children();
      offset(r=-wall) {
        children();
      }
    }
  }
}


function sum_of_sines(a,sines) = len(sines)==0? 0 :
    len(sines)==1?sines[0][0]*sin(a*sines[0][1]+(len(sines[0])>2?sines[0][2]:0)):
    sum_of_sines(a,[sines[0]])+sum_of_sines(a,cdr(sines));


module modulated_circle(r=40, sines=[10])
{
  freqs = len(sines)>0? [for (i=sines) i[1]] : [5];
  points = [
      for (a = [0 : (360/segs(r)/max(freqs)) : 360])
          let(nr=r+sum_of_sines(a,sines)) [nr*cos(a), nr*sin(a)]
  ];
  polygon(points);
}


function bez_B0(curve,u) = curve[0]*pow((1-u),3);
function bez_B1(curve,u) = curve[1]*(3*u*pow((1-u),2));
function bez_B2(curve,u) = curve[2]*(3*pow(u,2)*(1-u));
function bez_B3(curve,u) = curve[3]*pow(u,3);
function bez_point(curve,u) = bez_B0(curve,u) + bez_B1(curve,u) + bez_B2(curve,u) + bez_B3(curve,u);

module bezier_path(bezier, splinesteps=16) {
	pointslist = [
		for (
			b = [0 : 3 : len(bezier)-4],
			l = [0 : splinesteps-1]
		) let (
			crv = [bezier[b+0], bezier[b+1], bezier[b+2], bezier[b+3]],
			u = l / (splinesteps-1)
		) bez_point(crv, u)
	];
	polygon(points=pointslist);
}

module revolve_bezier(bezier, splinesteps=16) {
	yrot(90) rotate_extrude(convexity=10) {
		xrot(180) zrot(-90) bezier_path(bezier, splinesteps);
	}
}


function bezier_close_to_axis(bezier) =
	let(bezend = len(bezier)-1)
		concat(
			[ [bezier[0][0], 0], [bezier[0][0], 0], bezier[0] ],
			bezier,
			[ bezier[bezend], [bezier[bezend][0], 0], [bezier[bezend][0], 0] ]
		);

module revolve_bezier_solid_to_axis(bezier, splinesteps=16) {
	revolve_bezier(bezier=bezier_close_to_axis(bezier), splinesteps=splinesteps);
}


function bezier_offset(inset, bezier) =
	let(backbez = reverse([ for (pt = bezier) [pt[0], pt[1]-inset] ]))
		concat(
			bezier,
			[bezier[len(bezier)-1]],
			[backbez[0]],
			backbez,
			[backbez[len(backbez)-1]],
			[bezier[0]],
			[bezier[0]]
		);

module revolve_bezier_offset_shell(bezier, offset=1, splinesteps=16) {
	revolve_bezier(bezier=bezier_offset(offset, bezier), splinesteps=splinesteps);
}


module extrude_along_bezier(bezier, splinesteps=16) {
	pointslist = [
		for (
			b = [0 : 3 : len(bezier)-4],
			l = [0 : splinesteps-2]
		) let (
			crv = [bezier[b+0], bezier[b+1], bezier[b+2], bezier[b+3]]
		) bez_point(crv, l / (splinesteps-1))
	];

	ptcount = len(pointslist);
	for (i = [0 : ptcount-2]) {
		pt1 = pointslist[i];
		pt2 = pointslist[i+1];
		pt0 = i==0? pt1 : pointslist[i-1];
		pt3 = (i>=ptcount-2)? pt2 : pointslist[i+2];
		dist = distance(pt1,pt2);
		v1 = pt2-pt1;
		v0 = (i==0)? v1 : (pt1-pt0);
		v2 = (i==ptcount-2)? v1 : (pt3-pt2);
		az1 = atan2(v1[1], v1[0]);
		alt1 = (len(pt1)<3)? 0 : atan2(v1[2], hypot(v1[1], v1[0]));
		az0 = atan2(v0[1], v0[0]);
		alt0 = (len(pt0)<3)? 0 : atan2(v0[2], hypot(v0[1], v0[0]));
		az2 = atan2(v2[1], v2[0]);
		alt2 = (len(pt2)<3)? 0 : atan2(v2[2], hypot(v2[1], v2[0]));
		translate(pt1) {
			difference() {
				rotate([0, 90-alt1, az1]) {
					translate([0, 0, -1]) {
						linear_extrude(height=dist*3, convexity=10) {
							children();
						}
					}
				}
				rotate([0, 90-(alt0+alt1)/2, (az0+az1)/2]) {
					translate([0, 0, -dist-0.05]) {
						cube(size=[99,99,dist*2], center=true);
					}
				}
				rotate([0, 90-(alt1+alt2)/2, (az1+az2)/2]) {
					translate([0, 0, dist+dist]) {
						cube(size=[99,99,dist*2], center=true);
					}
				}
			}
		}
	}
}


// vim: noexpandtab tabstop=4 shiftwidth=4 softtabstop=4 nowrap
// use <GDMUtils.scad>

filter_diam    = 33.0;  // mm
filter_thick   =  2.0;  // mm
slot_width     =  2.0;  // mm
wall_size      =  2.0;  // mm
descender_drop =  1.5;  // mm
descender_size =  4.0;  // mm
descender_ang  = 30.0;  // deg
standoff_count =  4;

$fa = 2;
$fs = 2;

slots = ceil((filter_diam-2*wall_size) / (slot_width+wall_size));
union() {
	difference() {
		cylinder(d=filter_diam, h=filter_thick, center=true);
		intersection() {
			grid_of(count=slots, spacing=slot_width+wall_size) {
				cube(size=[slot_width, filter_diam, filter_thick+1], center=true);
			}
			cylinder(d=filter_diam-2*wall_size, h=filter_thick+1, center=true);
		}
	}
	zrot_copies(count=standoff_count) {
		translate([(filter_diam-wall_size)/2, 0, filter_thick/2+descender_drop/2]) {
			cube(size=[wall_size, wall_size, descender_drop], center=true);
		}
		translate([(filter_diam-wall_size)/2, 0, filter_thick/2+descender_drop]) {
			translate([wall_size/2, 0, 0]) {
				yrot(-descender_ang) {
					translate([-wall_size/2, 0, descender_size/2]) {
						cube(size=[wall_size, wall_size, descender_size], center=true);
					}
				}
			}
		}
	}
}


// vim: noexpandtab tabstop=4 shiftwidth=4 softtabstop=4 nowrap
